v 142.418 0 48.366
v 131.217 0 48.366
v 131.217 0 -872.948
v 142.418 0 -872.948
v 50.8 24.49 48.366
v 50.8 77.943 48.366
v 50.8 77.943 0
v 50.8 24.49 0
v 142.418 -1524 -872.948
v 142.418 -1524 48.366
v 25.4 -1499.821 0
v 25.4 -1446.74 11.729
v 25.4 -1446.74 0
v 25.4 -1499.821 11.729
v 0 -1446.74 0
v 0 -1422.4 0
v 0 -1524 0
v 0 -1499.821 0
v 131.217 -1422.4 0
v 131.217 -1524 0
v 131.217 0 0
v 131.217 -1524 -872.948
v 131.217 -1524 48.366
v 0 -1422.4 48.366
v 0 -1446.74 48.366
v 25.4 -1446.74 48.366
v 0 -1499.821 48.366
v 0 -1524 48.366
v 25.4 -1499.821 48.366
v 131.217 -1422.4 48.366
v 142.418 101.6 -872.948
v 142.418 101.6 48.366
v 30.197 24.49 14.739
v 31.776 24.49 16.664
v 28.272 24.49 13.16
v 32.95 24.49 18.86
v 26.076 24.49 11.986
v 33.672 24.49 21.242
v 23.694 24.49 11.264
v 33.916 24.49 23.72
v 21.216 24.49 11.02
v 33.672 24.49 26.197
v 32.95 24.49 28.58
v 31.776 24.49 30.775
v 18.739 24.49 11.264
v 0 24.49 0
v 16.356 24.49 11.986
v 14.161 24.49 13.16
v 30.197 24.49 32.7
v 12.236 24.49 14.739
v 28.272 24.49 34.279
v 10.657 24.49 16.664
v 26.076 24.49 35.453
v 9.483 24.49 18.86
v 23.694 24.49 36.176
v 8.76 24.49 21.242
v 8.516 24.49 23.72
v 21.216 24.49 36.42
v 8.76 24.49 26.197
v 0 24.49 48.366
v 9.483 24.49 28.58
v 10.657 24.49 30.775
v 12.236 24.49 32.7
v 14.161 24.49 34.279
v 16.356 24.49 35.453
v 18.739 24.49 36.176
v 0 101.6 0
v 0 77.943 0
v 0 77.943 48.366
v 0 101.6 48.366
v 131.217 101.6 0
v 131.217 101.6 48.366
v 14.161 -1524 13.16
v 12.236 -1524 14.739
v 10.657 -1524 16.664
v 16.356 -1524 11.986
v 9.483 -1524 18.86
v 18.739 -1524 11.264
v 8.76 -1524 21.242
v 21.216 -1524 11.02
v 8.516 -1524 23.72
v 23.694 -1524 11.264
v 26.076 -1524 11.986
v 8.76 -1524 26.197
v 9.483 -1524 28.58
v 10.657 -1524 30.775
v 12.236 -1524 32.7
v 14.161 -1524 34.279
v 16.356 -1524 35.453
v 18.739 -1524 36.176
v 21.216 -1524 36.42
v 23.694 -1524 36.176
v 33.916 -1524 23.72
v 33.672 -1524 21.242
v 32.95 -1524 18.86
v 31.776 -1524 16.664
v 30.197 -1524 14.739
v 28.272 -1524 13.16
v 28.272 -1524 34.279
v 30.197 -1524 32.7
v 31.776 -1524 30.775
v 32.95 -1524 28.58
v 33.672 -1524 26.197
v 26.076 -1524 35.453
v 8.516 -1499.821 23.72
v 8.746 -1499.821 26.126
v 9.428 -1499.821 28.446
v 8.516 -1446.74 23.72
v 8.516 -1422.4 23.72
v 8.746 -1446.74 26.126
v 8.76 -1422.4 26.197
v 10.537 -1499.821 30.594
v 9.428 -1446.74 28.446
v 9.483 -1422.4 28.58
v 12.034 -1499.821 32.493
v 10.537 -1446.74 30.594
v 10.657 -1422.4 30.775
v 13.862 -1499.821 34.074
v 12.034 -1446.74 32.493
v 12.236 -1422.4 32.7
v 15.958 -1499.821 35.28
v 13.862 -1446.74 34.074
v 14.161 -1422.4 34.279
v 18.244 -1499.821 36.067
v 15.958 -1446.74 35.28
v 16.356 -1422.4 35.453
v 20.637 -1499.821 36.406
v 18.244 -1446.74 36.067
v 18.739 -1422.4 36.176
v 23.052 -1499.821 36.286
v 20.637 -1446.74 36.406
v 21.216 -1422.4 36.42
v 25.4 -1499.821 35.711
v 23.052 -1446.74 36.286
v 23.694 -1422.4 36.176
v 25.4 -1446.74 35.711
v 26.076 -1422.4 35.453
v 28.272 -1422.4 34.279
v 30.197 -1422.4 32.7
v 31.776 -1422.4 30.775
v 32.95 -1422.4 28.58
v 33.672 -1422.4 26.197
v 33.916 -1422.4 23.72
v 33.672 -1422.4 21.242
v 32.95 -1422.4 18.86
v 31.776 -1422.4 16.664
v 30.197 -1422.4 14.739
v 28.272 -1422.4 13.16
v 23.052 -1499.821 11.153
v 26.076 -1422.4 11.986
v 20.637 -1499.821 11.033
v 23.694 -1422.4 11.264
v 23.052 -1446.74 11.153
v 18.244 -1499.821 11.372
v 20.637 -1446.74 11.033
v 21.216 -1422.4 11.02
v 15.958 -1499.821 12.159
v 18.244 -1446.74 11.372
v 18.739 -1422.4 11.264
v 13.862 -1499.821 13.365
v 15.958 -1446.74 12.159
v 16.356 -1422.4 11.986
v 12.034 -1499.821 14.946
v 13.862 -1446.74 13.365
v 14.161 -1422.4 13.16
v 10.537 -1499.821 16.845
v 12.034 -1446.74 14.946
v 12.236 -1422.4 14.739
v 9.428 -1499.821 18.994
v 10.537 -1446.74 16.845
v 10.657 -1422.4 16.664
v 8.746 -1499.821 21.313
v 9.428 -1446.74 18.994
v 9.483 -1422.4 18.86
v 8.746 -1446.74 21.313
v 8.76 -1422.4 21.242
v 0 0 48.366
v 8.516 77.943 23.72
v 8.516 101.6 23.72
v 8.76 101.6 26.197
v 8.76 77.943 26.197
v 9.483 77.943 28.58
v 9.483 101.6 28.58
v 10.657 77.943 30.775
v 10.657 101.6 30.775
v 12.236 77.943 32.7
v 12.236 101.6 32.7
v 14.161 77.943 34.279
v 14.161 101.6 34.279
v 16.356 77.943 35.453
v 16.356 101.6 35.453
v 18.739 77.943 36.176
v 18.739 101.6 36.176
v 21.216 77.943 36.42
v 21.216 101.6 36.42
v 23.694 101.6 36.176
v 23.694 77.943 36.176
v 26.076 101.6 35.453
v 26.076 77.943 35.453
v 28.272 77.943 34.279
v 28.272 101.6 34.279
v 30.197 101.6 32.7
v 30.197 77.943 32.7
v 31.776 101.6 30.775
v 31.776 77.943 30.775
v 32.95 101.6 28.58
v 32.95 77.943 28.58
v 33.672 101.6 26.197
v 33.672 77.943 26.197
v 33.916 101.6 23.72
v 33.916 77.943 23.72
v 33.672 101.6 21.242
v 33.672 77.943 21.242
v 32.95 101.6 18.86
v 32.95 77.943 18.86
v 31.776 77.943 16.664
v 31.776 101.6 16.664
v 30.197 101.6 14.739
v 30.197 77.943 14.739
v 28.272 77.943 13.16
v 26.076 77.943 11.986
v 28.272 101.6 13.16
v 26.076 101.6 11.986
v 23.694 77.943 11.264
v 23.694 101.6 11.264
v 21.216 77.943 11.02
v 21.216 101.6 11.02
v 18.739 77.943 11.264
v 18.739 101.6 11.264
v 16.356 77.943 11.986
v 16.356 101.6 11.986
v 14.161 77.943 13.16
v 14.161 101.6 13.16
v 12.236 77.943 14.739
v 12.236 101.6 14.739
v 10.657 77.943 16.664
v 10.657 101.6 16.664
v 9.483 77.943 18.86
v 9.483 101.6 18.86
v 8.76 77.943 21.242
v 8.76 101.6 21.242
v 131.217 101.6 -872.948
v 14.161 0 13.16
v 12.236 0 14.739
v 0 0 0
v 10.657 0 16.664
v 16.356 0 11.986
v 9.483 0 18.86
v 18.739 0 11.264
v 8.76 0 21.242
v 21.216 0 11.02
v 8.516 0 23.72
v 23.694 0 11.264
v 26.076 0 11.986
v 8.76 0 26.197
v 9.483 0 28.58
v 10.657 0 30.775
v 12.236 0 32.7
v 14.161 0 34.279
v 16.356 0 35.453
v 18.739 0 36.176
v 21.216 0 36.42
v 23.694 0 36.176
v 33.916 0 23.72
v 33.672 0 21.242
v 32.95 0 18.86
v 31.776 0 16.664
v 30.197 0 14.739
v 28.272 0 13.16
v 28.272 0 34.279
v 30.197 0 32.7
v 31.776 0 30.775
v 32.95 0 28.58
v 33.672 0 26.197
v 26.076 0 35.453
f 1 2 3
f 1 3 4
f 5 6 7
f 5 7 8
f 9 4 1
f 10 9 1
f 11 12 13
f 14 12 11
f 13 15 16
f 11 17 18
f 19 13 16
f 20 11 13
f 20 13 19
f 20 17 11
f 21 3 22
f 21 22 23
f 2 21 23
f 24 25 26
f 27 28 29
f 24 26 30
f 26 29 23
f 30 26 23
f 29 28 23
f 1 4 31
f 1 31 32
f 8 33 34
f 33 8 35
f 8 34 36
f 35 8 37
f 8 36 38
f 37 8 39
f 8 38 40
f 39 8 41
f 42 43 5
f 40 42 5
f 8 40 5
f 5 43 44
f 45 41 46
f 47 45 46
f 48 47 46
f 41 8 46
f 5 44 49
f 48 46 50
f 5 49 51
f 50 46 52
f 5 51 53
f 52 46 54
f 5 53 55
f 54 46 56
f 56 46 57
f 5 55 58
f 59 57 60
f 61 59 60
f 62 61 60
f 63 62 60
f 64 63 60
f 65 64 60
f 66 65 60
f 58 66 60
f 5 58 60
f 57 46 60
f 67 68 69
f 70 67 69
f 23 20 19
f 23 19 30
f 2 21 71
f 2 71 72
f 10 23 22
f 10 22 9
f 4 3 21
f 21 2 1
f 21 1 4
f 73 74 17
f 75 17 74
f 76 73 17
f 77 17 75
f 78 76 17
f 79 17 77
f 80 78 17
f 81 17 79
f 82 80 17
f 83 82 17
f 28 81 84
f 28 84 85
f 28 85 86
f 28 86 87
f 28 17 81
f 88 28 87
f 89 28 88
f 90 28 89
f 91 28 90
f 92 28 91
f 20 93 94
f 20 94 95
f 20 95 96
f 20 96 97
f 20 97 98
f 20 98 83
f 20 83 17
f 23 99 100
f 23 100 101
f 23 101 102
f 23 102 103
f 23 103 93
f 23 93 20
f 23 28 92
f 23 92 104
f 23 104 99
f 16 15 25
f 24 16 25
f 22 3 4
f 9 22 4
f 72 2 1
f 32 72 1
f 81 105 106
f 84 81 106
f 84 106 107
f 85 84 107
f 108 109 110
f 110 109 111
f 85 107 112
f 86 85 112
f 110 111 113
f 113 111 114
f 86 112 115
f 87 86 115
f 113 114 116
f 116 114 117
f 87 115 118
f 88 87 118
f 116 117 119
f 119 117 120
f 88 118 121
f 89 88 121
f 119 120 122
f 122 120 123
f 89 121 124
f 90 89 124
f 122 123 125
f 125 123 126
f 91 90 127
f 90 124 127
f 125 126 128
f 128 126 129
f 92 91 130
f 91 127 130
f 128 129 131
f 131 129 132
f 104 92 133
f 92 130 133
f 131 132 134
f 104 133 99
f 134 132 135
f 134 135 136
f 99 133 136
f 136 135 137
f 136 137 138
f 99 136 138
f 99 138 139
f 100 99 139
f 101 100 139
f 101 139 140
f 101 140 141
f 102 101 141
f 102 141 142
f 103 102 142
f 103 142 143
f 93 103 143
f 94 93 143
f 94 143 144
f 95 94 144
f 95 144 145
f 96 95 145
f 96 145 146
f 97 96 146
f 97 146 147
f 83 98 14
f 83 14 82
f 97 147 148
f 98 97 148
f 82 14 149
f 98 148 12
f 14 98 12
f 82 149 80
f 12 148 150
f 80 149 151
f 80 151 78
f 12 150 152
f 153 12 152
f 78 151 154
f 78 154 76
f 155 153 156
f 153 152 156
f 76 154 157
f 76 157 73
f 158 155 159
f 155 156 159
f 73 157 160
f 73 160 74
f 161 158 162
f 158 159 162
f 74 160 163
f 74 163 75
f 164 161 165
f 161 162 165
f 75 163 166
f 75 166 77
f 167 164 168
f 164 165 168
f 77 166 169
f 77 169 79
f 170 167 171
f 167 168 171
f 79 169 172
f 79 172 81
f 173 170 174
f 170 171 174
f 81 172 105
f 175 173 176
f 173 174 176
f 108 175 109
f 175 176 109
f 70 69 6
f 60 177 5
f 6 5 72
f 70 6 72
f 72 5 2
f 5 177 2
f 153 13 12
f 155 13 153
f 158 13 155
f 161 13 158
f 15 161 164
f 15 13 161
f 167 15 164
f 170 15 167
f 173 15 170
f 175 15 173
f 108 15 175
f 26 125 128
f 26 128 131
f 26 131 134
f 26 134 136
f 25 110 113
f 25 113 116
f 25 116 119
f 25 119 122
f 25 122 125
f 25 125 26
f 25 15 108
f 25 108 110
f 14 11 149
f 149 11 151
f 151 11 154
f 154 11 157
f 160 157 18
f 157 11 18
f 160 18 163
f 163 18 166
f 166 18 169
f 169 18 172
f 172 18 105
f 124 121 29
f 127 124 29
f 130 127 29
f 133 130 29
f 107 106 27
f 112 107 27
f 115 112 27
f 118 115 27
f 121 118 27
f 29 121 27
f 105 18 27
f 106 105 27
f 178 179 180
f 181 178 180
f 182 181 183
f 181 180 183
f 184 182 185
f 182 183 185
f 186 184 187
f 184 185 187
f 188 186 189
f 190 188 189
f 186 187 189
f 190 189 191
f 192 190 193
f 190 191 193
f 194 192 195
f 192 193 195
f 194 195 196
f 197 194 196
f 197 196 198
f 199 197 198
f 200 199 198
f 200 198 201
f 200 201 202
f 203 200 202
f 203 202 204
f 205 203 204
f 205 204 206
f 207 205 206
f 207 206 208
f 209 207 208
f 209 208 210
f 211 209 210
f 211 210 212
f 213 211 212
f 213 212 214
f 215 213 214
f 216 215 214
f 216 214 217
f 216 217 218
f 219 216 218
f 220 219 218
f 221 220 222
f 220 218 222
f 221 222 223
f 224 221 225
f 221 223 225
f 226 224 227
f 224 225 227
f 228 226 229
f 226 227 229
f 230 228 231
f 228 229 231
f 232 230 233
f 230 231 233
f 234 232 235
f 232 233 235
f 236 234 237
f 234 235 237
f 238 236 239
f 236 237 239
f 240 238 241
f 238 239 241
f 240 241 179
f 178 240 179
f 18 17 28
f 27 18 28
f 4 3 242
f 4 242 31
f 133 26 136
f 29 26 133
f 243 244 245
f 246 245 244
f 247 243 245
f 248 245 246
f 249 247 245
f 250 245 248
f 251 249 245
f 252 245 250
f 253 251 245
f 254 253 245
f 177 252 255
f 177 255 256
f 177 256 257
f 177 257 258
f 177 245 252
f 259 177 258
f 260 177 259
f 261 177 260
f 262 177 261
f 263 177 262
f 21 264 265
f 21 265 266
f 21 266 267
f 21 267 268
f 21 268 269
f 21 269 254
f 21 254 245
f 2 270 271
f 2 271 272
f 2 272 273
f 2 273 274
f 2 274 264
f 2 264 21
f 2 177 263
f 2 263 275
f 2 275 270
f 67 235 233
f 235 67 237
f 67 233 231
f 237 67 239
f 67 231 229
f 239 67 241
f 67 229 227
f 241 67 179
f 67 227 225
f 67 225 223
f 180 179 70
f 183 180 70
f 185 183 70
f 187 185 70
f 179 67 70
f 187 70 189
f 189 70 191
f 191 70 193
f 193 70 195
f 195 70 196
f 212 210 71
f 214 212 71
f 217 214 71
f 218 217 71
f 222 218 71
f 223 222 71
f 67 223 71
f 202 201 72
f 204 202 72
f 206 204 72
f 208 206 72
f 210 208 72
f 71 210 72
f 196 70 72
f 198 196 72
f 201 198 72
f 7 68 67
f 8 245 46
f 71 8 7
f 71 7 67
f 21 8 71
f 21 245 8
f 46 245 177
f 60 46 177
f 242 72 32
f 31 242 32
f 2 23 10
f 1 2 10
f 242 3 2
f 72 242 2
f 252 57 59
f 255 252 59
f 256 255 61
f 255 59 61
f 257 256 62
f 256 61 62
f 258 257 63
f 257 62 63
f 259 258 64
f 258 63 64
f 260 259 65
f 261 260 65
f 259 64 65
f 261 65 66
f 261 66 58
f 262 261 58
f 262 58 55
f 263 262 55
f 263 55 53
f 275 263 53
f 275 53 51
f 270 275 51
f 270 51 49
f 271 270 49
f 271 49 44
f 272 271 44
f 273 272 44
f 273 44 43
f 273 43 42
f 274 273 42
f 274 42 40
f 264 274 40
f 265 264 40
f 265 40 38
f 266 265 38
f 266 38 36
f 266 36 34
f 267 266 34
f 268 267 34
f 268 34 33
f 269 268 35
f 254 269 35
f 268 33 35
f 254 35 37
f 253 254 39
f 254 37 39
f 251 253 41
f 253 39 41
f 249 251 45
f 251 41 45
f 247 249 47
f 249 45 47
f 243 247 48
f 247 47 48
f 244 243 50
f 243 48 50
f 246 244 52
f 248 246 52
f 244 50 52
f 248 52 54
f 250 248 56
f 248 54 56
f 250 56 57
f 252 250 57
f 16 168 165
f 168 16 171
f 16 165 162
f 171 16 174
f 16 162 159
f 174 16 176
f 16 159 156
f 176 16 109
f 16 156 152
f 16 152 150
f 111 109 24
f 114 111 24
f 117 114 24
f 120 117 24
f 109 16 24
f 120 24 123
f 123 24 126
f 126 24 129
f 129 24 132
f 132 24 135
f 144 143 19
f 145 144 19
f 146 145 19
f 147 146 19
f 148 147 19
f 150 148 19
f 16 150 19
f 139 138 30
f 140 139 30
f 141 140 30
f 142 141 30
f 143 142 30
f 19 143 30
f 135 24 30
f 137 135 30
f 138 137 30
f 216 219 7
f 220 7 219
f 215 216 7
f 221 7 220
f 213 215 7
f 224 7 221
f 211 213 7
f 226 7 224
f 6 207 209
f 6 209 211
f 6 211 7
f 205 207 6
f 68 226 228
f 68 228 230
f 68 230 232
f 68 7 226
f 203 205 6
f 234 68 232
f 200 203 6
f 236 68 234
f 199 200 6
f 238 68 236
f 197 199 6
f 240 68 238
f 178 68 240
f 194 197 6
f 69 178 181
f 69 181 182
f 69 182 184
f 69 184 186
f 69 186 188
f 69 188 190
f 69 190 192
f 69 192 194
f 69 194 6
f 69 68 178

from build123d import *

# Parameters (mm, degrees)
F0_W      = 131.2171369791
F0_H      = 48.365816474
F1_DEPTH  = 101.6
F2_W      = 11.2009495497
F2_H      = 921.3137179613
F3_DEPTH  = 1524
F4_DEPTH  = 101.6
F5_DEPTH  = 101.6
F6_W      = 131.2171369791
F6_H      = 48.365816474
F7_DEPTH  = 101.6
F8_W      = 53.081035614
F8_H      = 48.365816474
F9_DEPTH  = 25.4
F11_D     = 25.4
F11_2_D   = 25.4
F12_W     = 53.4534361213
F12_H     = 48.365816474
F13_DEPTH = 50.8


with BuildPart() as f1:
    # F0 (on Front) → F1 (new body)
    with BuildSketch(Plane.XZ):
        with Locations((65.6085684896, 24.182908237)):
            Rectangle(F0_W, F0_H)
    extrude(amount=-F1_DEPTH)



with BuildPart() as f3:
    # F2 (on face) → F3 (new body)
    with BuildSketch(Plane.XZ):
        with Locations((136.8176117539, -412.2910425067)):
            Rectangle(F2_W, F2_H)
    extrude(amount=F3_DEPTH)


with BuildPart() as f1_1:
    add(f1.part)
    # F4 (add): a face of the model
    f4_faces = [f3.part.faces().sort_by_distance(p)[0] for p in [
        (136.8176117539, 0, -412.2910425067),
    ]]

    add(f3.part)  # F4 merges F3
    extrude(f4_faces, amount=-F4_DEPTH)


with BuildPart() as f5:
    # F5 (new): a face of the model
    f5_faces = [f1_1.part.faces().sort_by_distance(p)[0] for p in [
        (136.8176117539, 0, -412.2910425067),
    ]]
    extrude(f5_faces, amount=F5_DEPTH)


with BuildPart() as f7:
    # F6 (on face) → F7 (new body)
    with BuildSketch(Plane.XZ.offset(1524)):
        with Locations((65.6085684896, 24.182908237)):
            Rectangle(F6_W, F6_H)
    extrude(amount=-F7_DEPTH)

    # F8 (on face) → F9 (cut)
    with BuildSketch(Plane(origin=(0, 0, 0), x_dir=(0, -1, 0), z_dir=(-1, 0, 0))):
        with Locations((1473.2800722122, 24.182908237)):
            Rectangle(F8_W, F8_H)
    extrude(amount=-F9_DEPTH, mode=Mode.SUBTRACT)

    # F11#2 (through all)
    with Locations(Plane.XZ.offset(1524)):
        with Locations((21.2162621319, 23.7196236849)):
            Hole(F11_2_D / 2)


with BuildPart() as f1_2:
    add(f1_1.part)

    # F11 (through all)
    with Locations(Plane.XZ.offset(1524)):
        with Locations((21.2162621319, 23.7196236849)):
            Hole(F11_D / 2)

    # F12 (on face) → F13 (cut)
    with BuildSketch(Plane(origin=(0, 0, 0), x_dir=(0, -1, 0), z_dir=(-1, 0, 0))):
        with Locations((-51.2164803222, 24.182908237)):
            Rectangle(F12_W, F12_H)
    extrude(amount=-F13_DEPTH, mode=Mode.SUBTRACT)


solid = Compound([f5.part, f7.part, f1_2.part])
